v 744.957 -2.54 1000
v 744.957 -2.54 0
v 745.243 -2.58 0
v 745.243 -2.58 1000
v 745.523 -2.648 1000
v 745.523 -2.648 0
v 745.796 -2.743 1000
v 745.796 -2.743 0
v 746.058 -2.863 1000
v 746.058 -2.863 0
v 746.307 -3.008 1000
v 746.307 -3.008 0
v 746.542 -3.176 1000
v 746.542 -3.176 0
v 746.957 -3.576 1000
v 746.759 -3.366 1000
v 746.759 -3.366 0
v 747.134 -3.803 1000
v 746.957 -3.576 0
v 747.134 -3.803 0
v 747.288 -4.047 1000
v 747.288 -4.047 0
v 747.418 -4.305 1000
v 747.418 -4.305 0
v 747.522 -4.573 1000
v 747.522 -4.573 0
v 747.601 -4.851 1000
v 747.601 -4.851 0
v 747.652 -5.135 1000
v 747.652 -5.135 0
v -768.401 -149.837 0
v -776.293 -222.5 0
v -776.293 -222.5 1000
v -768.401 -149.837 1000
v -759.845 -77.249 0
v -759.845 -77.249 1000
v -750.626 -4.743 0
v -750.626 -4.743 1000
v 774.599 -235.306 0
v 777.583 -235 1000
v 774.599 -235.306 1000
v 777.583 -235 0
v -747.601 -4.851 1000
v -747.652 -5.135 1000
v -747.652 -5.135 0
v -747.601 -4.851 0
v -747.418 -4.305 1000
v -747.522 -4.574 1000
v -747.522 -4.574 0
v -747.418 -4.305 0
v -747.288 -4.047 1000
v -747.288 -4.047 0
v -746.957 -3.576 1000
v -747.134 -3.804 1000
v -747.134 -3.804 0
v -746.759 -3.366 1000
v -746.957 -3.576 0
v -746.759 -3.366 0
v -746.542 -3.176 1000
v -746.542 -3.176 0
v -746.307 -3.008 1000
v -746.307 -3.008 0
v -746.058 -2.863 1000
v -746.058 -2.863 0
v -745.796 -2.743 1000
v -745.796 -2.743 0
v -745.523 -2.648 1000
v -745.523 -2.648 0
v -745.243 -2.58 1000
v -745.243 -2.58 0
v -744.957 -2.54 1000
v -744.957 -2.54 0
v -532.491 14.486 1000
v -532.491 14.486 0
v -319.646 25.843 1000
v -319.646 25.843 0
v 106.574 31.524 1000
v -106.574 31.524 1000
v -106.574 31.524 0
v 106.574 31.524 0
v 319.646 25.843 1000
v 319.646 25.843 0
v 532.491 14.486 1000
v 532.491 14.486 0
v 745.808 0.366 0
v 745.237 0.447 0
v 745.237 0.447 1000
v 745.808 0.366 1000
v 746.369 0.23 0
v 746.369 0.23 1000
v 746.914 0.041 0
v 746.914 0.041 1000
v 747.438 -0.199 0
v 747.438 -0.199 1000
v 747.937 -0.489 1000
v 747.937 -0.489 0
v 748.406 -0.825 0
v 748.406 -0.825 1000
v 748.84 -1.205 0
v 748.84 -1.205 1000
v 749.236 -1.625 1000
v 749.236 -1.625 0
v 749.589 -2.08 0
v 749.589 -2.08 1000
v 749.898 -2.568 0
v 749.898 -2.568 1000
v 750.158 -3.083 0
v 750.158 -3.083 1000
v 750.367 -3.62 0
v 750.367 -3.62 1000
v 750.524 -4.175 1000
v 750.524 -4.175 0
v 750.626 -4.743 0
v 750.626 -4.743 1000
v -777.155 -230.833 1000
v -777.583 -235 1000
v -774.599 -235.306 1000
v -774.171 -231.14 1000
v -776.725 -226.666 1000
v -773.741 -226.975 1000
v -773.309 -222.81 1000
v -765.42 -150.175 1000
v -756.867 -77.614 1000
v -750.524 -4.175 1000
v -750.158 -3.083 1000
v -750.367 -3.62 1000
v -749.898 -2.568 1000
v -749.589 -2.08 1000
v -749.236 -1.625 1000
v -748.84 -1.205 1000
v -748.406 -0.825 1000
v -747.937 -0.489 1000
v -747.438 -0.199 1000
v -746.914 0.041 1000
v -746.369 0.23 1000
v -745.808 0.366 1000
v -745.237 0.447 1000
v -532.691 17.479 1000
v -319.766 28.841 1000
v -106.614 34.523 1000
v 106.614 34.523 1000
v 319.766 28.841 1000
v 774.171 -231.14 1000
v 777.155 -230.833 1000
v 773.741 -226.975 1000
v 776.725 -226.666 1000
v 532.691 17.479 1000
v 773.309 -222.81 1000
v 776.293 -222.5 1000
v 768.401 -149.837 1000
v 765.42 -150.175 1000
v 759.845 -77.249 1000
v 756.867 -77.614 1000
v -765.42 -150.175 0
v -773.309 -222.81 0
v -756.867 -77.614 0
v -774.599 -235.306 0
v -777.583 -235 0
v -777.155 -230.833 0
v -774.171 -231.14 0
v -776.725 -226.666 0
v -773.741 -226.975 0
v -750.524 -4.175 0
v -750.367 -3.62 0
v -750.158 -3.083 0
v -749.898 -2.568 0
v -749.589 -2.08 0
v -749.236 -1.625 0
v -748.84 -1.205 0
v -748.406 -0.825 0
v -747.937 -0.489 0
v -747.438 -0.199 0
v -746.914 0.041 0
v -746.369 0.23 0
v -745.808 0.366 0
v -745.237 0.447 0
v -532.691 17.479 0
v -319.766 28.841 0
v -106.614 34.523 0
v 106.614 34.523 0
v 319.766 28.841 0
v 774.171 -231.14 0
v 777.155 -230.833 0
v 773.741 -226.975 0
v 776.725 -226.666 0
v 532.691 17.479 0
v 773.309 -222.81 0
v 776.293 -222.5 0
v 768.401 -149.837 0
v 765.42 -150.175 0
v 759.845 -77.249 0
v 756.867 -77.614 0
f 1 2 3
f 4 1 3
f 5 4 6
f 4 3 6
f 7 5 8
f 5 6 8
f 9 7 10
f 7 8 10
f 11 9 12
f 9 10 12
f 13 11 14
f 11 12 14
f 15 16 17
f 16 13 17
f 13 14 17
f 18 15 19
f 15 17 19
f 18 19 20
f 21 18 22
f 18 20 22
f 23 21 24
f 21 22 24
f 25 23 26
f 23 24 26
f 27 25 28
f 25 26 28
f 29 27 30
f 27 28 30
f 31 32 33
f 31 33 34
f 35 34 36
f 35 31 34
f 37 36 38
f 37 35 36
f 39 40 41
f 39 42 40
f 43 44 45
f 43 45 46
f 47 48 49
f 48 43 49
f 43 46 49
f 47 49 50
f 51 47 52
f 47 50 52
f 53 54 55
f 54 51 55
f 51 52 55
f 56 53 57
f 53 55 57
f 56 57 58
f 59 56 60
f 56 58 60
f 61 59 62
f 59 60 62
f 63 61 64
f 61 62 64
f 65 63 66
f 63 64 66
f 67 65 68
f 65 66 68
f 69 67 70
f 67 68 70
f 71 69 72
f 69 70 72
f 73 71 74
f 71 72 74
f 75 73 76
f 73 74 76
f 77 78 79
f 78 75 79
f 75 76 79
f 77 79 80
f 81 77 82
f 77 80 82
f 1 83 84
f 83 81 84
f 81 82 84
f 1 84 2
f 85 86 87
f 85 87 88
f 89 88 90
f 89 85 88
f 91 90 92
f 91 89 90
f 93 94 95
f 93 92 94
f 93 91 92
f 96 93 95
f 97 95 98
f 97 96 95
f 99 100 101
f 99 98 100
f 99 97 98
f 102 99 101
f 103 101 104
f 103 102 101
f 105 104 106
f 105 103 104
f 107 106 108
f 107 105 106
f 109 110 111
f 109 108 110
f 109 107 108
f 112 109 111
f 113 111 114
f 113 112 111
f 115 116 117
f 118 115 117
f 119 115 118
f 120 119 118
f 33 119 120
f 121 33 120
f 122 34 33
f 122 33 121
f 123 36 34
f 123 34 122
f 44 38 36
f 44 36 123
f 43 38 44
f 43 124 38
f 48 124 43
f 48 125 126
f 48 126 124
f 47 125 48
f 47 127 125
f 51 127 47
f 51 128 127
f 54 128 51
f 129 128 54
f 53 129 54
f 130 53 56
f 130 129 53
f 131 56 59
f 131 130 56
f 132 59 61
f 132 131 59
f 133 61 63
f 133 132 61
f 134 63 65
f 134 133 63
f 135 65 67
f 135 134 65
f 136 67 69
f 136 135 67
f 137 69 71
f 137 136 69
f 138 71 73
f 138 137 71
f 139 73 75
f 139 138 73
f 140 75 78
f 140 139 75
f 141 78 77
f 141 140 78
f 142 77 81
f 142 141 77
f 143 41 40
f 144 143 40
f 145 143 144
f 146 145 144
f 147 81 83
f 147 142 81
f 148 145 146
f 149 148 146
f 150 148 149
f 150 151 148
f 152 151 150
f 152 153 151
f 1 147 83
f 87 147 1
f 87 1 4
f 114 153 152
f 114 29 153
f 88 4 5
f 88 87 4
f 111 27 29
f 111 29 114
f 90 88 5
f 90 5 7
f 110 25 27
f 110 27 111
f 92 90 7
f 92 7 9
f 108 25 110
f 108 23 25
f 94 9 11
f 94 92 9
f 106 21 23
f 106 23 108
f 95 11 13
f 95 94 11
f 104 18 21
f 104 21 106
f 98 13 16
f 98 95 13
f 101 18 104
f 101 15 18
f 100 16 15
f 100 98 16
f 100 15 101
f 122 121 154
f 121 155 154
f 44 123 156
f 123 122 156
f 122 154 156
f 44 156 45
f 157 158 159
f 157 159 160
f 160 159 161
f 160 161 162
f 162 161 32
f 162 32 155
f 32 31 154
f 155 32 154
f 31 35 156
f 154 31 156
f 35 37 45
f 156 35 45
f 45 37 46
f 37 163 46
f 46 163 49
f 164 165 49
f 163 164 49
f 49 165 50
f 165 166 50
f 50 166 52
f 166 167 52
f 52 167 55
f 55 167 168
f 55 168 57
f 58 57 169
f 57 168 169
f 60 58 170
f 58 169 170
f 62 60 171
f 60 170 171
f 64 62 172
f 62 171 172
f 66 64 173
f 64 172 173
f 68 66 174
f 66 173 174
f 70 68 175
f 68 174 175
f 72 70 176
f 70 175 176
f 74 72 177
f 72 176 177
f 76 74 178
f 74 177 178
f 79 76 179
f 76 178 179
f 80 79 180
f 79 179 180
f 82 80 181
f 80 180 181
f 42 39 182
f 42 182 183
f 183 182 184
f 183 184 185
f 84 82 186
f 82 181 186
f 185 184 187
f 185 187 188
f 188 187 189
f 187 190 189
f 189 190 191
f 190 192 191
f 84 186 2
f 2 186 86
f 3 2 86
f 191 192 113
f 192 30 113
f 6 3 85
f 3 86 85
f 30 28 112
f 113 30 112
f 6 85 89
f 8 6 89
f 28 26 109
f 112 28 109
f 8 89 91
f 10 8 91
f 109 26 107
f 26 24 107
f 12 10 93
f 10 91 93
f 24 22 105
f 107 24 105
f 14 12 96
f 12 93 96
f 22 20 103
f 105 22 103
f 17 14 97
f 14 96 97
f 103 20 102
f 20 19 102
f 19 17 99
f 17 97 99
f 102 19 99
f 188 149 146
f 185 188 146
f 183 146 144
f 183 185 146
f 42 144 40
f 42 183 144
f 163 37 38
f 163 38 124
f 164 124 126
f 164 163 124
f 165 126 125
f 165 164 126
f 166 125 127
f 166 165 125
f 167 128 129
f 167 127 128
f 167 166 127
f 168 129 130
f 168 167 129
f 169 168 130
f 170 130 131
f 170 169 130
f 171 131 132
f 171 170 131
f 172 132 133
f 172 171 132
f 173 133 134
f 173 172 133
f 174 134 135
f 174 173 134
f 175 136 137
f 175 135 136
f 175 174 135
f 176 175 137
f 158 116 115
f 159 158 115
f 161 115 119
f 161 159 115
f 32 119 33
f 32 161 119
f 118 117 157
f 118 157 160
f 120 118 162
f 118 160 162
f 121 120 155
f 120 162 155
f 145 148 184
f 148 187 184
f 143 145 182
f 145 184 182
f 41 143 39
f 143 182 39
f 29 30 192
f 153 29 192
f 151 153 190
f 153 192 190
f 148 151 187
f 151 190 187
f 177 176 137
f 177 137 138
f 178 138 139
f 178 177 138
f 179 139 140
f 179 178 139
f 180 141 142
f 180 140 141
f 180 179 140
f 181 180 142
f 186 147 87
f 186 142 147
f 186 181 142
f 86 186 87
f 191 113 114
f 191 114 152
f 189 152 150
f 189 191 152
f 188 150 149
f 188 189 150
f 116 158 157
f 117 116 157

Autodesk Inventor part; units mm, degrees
ref_plane "YZ Plane" through (0, 0, 0) normal (1, 0, 0) x (0, 1, 0)
ref_plane "XZ Plane" through (0, 0, 0) normal (0, 1, 0) x (-1, 0, 0)
ref_plane "XY Plane" through (0, 0, 0) normal (0, 0, 1) x (1, 0, 0)
sketch "Sketch1" plane through (0, 0, 0) normal (0, 0, 1) x (1, 0, 0)
  line L0 (-750, 0) -> (750, 0) construction
  line L1 (750, 0) -> (750, -2100) construction
  line L2 (750, -2100) -> (110, -2700) construction
  line L3 (108.9077, -2700) -> (-108.9077, -2700) construction
  line L4 (-110, -2700) -> (-750, -2100) construction
  line L5 (-750, -2100) -> (-750, 0) construction
  arc A0 (745.2369, 0.4471) -> (-745.2369, 0.4471) centre (0, -7964.7662) ccw
  arc A1 (-750.6265, -4.7429) -> (-776.2932, -222.5) centre (7180.7944, -1050) ccw
  arc A2 (-777.5832, -235) -> (-778.8534, -247.5) centre (7180.7944, -1050) ccw construction
  arc A3 (750.1285, -2099.0286) -> (778.8534, -247.5) centre (-7180.7944, -1050) ccw construction
  arc A4 (777.5832, -235) -> (776.2932, -222.5) centre (-7180.7944, -1050) ccw
  line L6 (-777.5832, -235) -> (777.5832, -235) construction
  arc A5 (-749.3229, -2100.7083) -> (-677.5699, -2174.8011) centre (5033.2984, 3427.5183) ccw construction
  line L7 (-750, -2100) -> (750, -2100) construction
  line L8 (-547.1729, -2035.7109) -> (-801.0834, -2306.5488) construction
  arc A6 (-677.5699, -2174.8011) -> (-110.8367, -2699.2976) centre (5033.2984, 3427.5183) ccw construction
  arc A7 (-745.2369, 0.4471) -> (-750.6265, -4.7429) centre (-744.6779, -5.5268) ccw
  arc A8 (750.6265, -4.7429) -> (745.2369, 0.4471) centre (744.6779, -5.5268) ccw
  arc A9 (-750.1285, -2099.0286) -> (-749.3229, -2100.7083) centre (-747.1545, -2098.6352) ccw construction
  arc A10 (110.8367, -2699.2976) -> (677.5699, -2174.8011) centre (-5033.2984, 3427.5183) ccw construction
  line L9 (553.8195, -2042.8006) -> (794.4368, -2299.4591) construction
  arc A11 (677.5699, -2174.8011) -> (749.3229, -2100.7083) centre (-5033.2984, 3427.5183) ccw construction
  arc A12 (749.3229, -2100.7083) -> (750.1285, -2099.0286) centre (747.1545, -2098.6352) ccw construction
  arc A13 (-110.8367, -2699.2976) -> (-108.9077, -2700) centre (-108.9077, -2697) ccw construction
  arc A14 (108.9077, -2700) -> (110.8367, -2699.2976) centre (108.9077, -2697) ccw construction
  line L10 (-778.8534, -247.5) -> (778.8534, -247.5) construction
  line L11 (-776.2932, -222.5) -> (776.2932, -222.5) construction
  arc A15 (-776.2932, -222.5) -> (-777.5832, -235) centre (7180.7944, -1050) ccw
  arc A16 (-778.8534, -247.5) -> (-750.1285, -2099.0286) centre (7180.7944, -1050) ccw construction
  arc A17 (778.8534, -247.5) -> (777.5832, -235) centre (-7180.7944, -1050) ccw construction
  arc A18 (776.2932, -222.5) -> (750.6265, -4.7429) centre (-7180.7944, -1050) ccw
  point P0 (0, 0)
  point P1 (0, 0)
  point P2 (0, -2700)
  point P3 (-674.1281, -2171.1299)
  point P4 (674.1281, -2171.1299)
  dimension "d17" = 1500
  dimension "d18" = 2100
  dimension "d19" = 220
  dimension "d20" = 2700
  dimension "d21" = 8000
  dimension "d31" = 8000
  dimension "d33" = 8000
  dimension "d34" = 235
  dimension "d35" = 8000
  dimension "d36" = 104
  dimension "d37" = 6
  dimension "d40" = 3
  dimension "d41" = 8000
  dimension "d42" = 104
  dimension "d44" = 3
  dimension "d46" = 12.5
  dimension "d47" = 12.5
contour flange "Contour Flange1" sketch "Sketch1" thickness 3 bend radius 3 width 1000 along (0, 0, 1) mid plane no both sides no wall seen from (776.9407, -228.7497, 0) lies toward (-0.9947169, -0.1026563, 0) curves A4 A18 A8 A0 A7 A1 A15
bend "Bend1"
corner "Corner1"
equation "\"d17\" = Бак_ширина_общая"
equation "\"d18\" = Бак_высота_до_конуса"
equation "\"d19\" = Бак_брюхо_ширина_полки"
equation "\"d20\" = Бак_высота_общая"
equation "\"d21\" = Бак_радиус_стенок_общий"
equation "\"d31\" = Бак_радиус_стенок_общий"
equation "\"d33\" = Бак_радиус_стенок_общий"
equation "\"d34\" = Бак_спина_длина_фланцев"
equation "\"d35\" = Бак_радиус_стенок_общий"
equation "\"d36\" = Бак_борт_длина_фланца"
equation "\"d37\" = Thickness + BendRadius"
equation "\"d40\" = Thickness"
equation "\"d41\" = Бак_радиус_стенок_общий"
equation "\"d42\" = d36"
equation "\"d46\" = Бак_нахлест_фланца"
equation "\"d47\" = Бак_нахлест_фланца"
equation "\"d3\" = Thickness"
equation "\"d4\" = BendReliefWidth"
equation "\"d5\" = BendReliefDepth"
equation "\"d6\" = MinimumRemnant"
equation "\"d7\" = TransitionRadius"
equation "\"d9\" = BendRadius"
equation "\"d11\" = CornerReliefSize"
equation "\"d12\" = GapSize"
equation "\"d13\" = JacobiRadiusSize"
equation "\"BendRadius\" = Thickness"
equation "\"BendReliefWidth\" = Thickness"
equation "\"BendReliefDepth\" = 0.5 * Thickness"
equation "\"CornerReliefSize\" = 4 * Thickness"
equation "\"MinimumRemnant\" = 2 * Thickness"
equation "\"TransitionRadius\" = BendRadius"
equation "\"JacobiRadiusSize\" = BendRadius"
equation "\"GapSize\" = Thickness"
equation "\"Бак_ширина_общая\" = 1500"
equation "\"Бак_высота_до_конуса\" = 2100"
equation "\"Бак_брюхо_ширина_полки\" = 220"
equation "\"Бак_радиус_стенок_общий\" = 8000"
equation "\"Бак_спина_длина_фланцев\" = 235"
equation "\"Thickness\" = 3"
equation "\"Бак_нахлест_фланца\" = 12.5"
equation "\"Бак_высота_общая\" = 2700"
equation "\"Бак_борт_длина_фланца\" = 104"
properties part number "МОО 010 лист спина 1" material "Stainless Steel AISI 304"
